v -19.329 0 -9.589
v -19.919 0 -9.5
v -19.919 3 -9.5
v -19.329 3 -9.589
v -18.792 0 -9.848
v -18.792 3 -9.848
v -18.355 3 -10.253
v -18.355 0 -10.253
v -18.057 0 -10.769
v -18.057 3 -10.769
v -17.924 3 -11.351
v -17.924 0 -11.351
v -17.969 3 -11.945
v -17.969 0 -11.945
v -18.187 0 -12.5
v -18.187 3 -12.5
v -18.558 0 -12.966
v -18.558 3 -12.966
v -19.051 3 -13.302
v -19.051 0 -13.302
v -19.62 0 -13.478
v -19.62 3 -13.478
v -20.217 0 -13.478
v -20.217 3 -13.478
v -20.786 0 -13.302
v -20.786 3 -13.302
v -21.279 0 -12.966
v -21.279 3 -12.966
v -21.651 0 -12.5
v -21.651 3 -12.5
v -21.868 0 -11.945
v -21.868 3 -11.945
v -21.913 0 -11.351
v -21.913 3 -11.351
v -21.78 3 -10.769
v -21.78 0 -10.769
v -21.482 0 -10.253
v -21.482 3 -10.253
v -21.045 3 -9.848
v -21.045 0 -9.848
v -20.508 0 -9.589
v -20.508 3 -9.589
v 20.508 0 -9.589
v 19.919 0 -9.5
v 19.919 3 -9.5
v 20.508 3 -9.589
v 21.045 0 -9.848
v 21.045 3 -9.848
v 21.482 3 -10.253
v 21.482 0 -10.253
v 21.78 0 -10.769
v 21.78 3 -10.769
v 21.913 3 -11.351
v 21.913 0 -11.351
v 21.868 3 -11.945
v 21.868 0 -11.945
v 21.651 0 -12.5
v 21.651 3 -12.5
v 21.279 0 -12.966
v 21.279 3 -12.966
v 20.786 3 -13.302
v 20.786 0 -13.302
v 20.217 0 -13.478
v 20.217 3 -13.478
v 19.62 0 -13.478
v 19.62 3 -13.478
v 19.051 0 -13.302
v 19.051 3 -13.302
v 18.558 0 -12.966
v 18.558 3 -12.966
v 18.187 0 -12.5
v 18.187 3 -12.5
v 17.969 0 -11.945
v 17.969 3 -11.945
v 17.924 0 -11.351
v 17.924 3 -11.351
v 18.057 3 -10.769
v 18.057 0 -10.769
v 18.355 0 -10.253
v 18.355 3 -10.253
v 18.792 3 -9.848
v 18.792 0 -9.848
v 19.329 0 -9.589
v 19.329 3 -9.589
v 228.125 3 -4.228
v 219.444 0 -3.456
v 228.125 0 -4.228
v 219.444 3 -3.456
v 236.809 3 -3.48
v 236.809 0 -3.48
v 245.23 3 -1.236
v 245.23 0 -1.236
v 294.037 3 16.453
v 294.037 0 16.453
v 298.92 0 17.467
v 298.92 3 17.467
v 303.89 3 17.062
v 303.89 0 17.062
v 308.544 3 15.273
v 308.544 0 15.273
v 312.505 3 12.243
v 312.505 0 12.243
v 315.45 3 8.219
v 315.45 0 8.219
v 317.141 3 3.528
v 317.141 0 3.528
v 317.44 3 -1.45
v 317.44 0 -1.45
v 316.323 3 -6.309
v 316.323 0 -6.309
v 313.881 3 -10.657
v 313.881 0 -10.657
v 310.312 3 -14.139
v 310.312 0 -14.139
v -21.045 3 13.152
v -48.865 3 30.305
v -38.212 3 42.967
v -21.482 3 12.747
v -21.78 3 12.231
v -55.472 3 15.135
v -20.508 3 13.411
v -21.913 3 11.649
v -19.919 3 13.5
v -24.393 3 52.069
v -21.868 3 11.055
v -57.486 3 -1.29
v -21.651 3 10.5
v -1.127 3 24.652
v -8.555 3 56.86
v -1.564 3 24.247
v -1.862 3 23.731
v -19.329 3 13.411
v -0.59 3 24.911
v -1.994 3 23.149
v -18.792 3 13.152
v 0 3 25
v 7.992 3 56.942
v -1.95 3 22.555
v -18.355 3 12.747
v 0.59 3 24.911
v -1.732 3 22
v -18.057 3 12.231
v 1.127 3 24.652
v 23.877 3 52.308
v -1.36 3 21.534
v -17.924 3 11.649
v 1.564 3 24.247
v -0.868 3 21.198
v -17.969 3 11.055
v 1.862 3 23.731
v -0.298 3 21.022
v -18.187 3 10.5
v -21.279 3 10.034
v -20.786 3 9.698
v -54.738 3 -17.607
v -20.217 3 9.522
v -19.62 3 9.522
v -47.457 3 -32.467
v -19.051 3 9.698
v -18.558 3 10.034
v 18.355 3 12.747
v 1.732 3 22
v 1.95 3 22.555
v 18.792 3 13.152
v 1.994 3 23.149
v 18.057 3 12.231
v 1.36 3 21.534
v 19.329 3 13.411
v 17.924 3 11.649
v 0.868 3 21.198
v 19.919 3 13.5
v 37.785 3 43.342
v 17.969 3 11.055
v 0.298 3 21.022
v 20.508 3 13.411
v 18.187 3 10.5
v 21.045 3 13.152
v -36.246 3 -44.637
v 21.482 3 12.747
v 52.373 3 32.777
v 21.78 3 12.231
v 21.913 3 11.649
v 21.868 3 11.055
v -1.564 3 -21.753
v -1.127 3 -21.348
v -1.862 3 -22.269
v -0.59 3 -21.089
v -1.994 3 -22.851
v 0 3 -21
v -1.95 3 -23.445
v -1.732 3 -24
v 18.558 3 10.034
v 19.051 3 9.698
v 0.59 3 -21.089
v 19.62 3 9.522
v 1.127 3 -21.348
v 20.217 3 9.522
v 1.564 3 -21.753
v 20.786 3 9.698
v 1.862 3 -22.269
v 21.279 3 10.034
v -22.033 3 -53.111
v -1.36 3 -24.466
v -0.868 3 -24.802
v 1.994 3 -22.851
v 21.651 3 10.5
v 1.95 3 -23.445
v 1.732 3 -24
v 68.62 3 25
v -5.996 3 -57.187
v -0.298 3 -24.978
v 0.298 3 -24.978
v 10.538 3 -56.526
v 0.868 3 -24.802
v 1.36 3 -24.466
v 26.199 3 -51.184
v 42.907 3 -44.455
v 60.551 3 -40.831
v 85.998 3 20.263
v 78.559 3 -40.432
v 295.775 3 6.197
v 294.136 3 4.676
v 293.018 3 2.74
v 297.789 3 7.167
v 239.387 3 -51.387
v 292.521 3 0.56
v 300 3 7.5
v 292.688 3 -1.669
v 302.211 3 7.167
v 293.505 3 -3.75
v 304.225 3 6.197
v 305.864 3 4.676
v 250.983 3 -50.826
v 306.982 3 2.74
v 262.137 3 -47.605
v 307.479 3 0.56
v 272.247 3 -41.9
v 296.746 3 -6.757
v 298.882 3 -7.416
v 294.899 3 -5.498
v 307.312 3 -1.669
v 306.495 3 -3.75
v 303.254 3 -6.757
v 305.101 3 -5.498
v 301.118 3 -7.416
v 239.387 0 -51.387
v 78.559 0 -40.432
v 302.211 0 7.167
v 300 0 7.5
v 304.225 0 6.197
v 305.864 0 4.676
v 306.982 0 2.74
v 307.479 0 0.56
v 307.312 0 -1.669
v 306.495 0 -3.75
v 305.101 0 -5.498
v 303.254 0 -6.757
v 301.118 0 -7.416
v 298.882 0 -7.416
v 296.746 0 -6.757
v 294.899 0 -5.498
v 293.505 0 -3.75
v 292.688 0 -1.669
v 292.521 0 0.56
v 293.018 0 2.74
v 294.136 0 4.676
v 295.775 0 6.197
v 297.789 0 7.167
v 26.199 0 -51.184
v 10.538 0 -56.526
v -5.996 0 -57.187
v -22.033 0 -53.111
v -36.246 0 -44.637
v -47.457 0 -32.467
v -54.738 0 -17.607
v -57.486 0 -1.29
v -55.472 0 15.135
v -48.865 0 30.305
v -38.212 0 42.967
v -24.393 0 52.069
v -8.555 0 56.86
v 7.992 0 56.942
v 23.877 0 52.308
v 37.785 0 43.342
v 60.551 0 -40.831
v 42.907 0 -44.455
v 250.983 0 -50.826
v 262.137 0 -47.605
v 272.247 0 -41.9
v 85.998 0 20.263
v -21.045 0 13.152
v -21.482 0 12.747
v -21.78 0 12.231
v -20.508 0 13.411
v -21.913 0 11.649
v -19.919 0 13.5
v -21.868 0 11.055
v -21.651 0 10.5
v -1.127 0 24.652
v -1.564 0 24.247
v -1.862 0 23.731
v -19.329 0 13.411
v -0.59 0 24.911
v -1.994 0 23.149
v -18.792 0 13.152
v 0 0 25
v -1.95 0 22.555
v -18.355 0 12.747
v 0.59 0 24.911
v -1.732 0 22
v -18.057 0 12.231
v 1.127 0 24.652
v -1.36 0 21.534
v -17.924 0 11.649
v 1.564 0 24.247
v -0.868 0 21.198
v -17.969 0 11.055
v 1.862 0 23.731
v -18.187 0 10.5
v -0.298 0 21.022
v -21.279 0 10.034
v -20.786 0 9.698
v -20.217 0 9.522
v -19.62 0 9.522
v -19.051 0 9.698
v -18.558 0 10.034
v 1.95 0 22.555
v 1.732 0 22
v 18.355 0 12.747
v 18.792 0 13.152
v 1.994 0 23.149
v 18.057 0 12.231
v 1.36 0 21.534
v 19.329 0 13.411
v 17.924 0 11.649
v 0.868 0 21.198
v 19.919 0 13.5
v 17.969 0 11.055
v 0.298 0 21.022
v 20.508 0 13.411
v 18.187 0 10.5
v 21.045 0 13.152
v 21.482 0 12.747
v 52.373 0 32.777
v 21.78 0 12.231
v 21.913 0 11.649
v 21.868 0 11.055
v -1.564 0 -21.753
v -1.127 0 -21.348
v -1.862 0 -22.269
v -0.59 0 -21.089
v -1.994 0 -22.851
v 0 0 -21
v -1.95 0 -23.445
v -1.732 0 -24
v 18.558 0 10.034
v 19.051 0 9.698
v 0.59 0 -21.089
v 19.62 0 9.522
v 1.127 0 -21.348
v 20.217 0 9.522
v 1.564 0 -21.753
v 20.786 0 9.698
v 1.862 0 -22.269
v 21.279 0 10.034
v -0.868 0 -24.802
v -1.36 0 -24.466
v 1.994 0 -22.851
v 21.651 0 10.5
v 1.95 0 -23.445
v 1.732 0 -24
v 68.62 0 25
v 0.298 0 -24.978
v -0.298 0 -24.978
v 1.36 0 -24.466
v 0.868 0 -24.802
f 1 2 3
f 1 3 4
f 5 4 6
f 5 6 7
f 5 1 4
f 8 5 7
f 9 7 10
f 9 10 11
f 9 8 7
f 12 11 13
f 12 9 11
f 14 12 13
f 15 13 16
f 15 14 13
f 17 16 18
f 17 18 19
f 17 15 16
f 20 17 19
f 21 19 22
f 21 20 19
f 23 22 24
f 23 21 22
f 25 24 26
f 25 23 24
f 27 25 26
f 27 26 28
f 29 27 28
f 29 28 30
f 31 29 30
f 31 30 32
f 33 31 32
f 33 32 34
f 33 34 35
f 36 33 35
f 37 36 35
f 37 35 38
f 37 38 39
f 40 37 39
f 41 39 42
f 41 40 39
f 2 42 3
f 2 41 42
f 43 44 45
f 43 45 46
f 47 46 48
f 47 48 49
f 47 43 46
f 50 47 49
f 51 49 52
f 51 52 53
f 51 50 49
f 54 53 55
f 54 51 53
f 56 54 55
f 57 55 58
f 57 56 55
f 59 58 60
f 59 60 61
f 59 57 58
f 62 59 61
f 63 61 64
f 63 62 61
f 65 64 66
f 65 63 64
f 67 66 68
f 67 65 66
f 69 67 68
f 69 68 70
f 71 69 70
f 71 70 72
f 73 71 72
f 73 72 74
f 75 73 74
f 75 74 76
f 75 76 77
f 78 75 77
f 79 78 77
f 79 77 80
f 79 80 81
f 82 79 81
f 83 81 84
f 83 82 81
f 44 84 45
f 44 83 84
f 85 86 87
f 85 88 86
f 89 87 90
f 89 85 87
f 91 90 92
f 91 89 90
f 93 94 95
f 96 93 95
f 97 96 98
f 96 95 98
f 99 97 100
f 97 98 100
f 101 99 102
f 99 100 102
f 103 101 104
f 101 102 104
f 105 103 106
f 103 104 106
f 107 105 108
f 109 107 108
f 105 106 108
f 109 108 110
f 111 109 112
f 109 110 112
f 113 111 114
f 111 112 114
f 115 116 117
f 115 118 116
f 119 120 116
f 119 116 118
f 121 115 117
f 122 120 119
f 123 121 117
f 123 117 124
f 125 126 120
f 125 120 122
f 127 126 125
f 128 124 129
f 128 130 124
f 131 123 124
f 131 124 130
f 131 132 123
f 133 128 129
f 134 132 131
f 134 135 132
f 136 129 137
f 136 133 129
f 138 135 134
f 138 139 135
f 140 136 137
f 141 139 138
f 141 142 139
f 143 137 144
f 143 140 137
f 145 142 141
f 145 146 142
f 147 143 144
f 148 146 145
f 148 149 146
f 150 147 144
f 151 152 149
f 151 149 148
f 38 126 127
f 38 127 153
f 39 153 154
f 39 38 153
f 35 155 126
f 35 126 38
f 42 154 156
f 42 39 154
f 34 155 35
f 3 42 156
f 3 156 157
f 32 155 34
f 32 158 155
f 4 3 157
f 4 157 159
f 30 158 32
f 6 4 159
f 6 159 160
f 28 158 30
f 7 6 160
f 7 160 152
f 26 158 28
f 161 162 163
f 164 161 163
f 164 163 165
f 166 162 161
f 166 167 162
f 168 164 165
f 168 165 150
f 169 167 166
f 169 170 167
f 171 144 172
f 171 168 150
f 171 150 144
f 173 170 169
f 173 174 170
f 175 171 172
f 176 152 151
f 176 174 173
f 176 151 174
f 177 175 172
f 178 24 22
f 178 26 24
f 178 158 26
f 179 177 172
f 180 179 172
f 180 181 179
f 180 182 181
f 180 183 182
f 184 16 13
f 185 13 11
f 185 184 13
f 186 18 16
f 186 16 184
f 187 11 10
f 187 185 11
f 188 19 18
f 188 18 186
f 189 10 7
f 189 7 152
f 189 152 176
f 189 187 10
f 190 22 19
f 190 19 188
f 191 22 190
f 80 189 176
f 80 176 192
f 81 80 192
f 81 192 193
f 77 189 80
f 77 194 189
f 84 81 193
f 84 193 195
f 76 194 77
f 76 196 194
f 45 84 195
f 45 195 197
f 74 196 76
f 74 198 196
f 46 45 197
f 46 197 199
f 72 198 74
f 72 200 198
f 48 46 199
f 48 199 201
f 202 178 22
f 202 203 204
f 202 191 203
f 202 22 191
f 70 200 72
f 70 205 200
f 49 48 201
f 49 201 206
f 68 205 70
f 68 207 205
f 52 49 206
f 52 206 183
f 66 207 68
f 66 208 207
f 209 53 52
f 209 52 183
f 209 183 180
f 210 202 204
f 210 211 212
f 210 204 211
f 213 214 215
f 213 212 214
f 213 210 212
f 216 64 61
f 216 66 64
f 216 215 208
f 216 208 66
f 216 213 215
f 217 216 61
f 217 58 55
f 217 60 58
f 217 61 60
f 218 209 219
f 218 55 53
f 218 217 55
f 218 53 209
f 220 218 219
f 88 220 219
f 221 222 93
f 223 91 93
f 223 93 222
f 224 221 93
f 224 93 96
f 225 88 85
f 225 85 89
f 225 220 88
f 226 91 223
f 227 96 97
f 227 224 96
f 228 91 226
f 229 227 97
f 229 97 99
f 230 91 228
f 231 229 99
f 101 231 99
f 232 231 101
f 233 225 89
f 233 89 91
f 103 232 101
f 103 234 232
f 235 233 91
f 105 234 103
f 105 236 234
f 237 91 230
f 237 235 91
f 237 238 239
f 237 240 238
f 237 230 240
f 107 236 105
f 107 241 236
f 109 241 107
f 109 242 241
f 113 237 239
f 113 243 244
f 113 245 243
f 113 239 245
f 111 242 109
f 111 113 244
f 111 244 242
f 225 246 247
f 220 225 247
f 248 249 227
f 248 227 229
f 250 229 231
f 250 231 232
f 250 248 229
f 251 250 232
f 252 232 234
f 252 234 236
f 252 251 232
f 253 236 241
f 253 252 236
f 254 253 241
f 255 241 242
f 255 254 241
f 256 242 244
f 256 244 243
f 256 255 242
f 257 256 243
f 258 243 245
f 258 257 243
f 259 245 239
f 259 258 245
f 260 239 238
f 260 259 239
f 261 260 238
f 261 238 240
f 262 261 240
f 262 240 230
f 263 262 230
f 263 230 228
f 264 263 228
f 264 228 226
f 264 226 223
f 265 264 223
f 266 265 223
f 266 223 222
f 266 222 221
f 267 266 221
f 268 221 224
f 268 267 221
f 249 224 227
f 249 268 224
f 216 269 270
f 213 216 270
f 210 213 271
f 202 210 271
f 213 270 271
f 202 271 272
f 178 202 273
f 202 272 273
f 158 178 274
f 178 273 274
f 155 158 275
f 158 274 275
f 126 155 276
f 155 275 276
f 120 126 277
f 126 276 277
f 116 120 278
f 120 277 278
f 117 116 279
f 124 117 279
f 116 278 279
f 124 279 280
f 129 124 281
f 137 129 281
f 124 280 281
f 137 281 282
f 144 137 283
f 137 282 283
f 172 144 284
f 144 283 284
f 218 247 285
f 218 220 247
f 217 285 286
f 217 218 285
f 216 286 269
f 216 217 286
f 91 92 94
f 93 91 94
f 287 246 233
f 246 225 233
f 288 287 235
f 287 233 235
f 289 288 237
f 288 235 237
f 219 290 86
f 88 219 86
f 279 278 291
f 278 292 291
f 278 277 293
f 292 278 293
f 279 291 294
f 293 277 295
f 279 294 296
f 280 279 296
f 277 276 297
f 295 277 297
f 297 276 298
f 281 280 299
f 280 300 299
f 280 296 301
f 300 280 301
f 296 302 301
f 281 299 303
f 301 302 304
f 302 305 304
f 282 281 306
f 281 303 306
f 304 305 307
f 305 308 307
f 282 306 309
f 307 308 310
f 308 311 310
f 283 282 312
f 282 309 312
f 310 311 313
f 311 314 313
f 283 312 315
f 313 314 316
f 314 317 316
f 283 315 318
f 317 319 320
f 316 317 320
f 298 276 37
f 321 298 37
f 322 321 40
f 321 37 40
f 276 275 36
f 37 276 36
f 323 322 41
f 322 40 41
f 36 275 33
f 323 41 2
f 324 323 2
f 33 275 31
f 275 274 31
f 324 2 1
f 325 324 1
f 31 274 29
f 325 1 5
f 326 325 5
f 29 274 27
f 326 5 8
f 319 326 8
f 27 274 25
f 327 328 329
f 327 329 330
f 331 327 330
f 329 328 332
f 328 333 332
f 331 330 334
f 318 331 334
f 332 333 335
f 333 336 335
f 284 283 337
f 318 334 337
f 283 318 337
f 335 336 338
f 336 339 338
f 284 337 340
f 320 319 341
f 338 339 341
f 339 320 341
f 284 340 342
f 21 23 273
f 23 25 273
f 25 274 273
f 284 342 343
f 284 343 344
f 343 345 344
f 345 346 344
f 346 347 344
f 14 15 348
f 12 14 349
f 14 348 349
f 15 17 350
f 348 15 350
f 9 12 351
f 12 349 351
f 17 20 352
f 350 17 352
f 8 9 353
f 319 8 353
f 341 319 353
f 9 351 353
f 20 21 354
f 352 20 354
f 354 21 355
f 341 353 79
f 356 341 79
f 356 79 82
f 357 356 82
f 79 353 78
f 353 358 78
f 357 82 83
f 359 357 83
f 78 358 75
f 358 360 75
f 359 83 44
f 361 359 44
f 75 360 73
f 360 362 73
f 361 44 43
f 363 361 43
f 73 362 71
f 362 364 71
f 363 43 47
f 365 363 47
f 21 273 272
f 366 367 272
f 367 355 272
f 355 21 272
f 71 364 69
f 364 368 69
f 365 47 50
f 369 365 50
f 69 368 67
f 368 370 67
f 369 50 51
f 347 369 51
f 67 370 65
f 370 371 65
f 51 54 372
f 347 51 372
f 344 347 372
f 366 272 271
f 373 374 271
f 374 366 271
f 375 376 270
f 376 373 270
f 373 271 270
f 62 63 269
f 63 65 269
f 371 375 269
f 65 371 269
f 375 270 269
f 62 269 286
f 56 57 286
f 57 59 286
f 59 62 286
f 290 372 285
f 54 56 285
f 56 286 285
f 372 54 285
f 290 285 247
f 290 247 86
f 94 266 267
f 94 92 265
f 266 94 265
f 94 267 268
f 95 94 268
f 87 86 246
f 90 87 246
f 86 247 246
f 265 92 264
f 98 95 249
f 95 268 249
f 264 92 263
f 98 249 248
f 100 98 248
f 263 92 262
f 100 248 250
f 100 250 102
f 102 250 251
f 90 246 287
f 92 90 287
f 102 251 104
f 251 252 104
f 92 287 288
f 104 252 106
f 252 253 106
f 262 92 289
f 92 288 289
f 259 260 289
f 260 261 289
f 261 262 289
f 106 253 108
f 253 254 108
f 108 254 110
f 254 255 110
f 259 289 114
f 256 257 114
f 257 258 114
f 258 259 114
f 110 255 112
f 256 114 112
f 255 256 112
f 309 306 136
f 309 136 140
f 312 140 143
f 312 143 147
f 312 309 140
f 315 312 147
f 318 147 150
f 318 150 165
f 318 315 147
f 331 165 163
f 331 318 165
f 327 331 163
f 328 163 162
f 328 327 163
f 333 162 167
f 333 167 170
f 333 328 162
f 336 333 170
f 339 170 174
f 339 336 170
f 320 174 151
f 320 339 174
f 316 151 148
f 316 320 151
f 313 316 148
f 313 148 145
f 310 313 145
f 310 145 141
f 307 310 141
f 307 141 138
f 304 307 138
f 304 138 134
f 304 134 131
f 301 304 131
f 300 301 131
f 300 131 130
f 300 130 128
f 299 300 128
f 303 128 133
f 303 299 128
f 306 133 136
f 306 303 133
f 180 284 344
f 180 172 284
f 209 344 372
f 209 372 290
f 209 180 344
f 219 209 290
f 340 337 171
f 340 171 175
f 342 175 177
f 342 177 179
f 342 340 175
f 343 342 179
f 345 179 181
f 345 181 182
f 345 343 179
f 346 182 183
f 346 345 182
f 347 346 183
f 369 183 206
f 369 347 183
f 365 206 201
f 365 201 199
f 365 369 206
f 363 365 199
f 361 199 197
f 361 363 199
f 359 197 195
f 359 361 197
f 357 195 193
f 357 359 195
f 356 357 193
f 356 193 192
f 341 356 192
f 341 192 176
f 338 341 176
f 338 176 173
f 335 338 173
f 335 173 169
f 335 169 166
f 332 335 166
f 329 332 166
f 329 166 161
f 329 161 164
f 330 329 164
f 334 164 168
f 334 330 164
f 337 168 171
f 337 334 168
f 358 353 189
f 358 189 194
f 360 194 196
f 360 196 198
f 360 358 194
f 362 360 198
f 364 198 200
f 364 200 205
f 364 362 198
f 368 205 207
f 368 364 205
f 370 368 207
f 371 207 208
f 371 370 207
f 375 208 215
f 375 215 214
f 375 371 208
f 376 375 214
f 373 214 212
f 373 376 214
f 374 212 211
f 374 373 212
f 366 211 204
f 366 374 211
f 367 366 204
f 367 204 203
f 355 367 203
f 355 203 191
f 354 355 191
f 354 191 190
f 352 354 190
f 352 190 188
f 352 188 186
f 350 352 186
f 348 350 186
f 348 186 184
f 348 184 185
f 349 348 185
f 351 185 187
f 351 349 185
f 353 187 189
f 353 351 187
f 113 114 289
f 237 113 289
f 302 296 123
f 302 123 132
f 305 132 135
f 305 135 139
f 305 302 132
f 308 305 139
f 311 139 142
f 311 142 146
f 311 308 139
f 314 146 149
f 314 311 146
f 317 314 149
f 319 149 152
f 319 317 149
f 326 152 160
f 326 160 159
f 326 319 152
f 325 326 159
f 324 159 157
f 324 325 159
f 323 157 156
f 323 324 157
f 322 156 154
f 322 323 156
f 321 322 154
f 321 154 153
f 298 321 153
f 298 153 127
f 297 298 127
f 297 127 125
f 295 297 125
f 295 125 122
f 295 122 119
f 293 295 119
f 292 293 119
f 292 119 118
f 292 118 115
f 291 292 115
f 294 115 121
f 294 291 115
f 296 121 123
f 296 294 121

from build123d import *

# Parameters (mm, degrees)
SKETCH1_R           = 2
SKETCH1_R_2         = 7.5
BOSS_EXTRUDE2_DEPTH = 3
FILLET1_R           = 50
FILLET2_R           = 100


with BuildPart() as part:
    # Sketch1 → Boss-Extrude2 (new body)
    with BuildSketch(Plane(origin=(0, 0, 0), x_dir=(1, 0, 0), z_dir=(0, 1, 0))):
        with BuildLine():
            Line((257.543524338, 52.623283), (43.136797408, 38.01929391))
            ThreePointArc((43.136797408, 38.01929391), (-57.072915612, -6.99516287), (51.041719813, -26.476269347))
            Line((51.041719813, -26.476269347), (232.634460204, 5.800541986))
            Line((232.634460204, 5.800541986), (294.037229007, -16.452822314))
            ThreePointArc((294.037229007, -16.452822314), (315.449808374, -8.21908883), (310.311776158, 14.139210461))
            Line((310.311776158, 14.139210461), (257.543524338, 52.623283))
        make_face()
        with Locations(Location((19.918584287, 11.5, 0), (0, 0, 270))):
            Circle(SKETCH1_R, mode=Mode.SUBTRACT)
        with Locations(Location((-19.918584287, 11.5, 0), (0, 0, 270))):
            Circle(SKETCH1_R, mode=Mode.SUBTRACT)
        with Locations(Location((0, 23, 0), (0, 0, 270))):
            Circle(SKETCH1_R, mode=Mode.SUBTRACT)
        with Locations(Location((0, -23, 0), (0, 0, 270))):
            Circle(SKETCH1_R, mode=Mode.SUBTRACT)
        with Locations(Location((-19.918584287, -11.5, 0), (0, 0, 270))):
            Circle(SKETCH1_R, mode=Mode.SUBTRACT)
        with Locations(Location((19.918584287, -11.5, 0), (0, 0, 270))):
            Circle(SKETCH1_R, mode=Mode.SUBTRACT)
        with Locations(Location((300, 0, 0), (0, 0, 270))):
            Circle(SKETCH1_R_2, mode=Mode.SUBTRACT)
    extrude(amount=BOSS_EXTRUDE2_DEPTH)

    # Fillet1
    fillet1_edges = [part.edges().sort_by_distance(p)[0] for p in [
        (232.634460204, 1.5, -5.800541986),
        (257.543524338, 1.5, -52.623283),
    ]]
    fillet(fillet1_edges, radius=FILLET1_R)

    # Fillet2
    fillet2_edges = [part.edges().sort_by_distance(p)[0] for p in [
        (51.041719813, 1.5, 26.476269347),
        (43.136797408, 1.5, -38.01929391),
    ]]
    fillet(fillet2_edges, radius=FILLET2_R)


solid = part.part
